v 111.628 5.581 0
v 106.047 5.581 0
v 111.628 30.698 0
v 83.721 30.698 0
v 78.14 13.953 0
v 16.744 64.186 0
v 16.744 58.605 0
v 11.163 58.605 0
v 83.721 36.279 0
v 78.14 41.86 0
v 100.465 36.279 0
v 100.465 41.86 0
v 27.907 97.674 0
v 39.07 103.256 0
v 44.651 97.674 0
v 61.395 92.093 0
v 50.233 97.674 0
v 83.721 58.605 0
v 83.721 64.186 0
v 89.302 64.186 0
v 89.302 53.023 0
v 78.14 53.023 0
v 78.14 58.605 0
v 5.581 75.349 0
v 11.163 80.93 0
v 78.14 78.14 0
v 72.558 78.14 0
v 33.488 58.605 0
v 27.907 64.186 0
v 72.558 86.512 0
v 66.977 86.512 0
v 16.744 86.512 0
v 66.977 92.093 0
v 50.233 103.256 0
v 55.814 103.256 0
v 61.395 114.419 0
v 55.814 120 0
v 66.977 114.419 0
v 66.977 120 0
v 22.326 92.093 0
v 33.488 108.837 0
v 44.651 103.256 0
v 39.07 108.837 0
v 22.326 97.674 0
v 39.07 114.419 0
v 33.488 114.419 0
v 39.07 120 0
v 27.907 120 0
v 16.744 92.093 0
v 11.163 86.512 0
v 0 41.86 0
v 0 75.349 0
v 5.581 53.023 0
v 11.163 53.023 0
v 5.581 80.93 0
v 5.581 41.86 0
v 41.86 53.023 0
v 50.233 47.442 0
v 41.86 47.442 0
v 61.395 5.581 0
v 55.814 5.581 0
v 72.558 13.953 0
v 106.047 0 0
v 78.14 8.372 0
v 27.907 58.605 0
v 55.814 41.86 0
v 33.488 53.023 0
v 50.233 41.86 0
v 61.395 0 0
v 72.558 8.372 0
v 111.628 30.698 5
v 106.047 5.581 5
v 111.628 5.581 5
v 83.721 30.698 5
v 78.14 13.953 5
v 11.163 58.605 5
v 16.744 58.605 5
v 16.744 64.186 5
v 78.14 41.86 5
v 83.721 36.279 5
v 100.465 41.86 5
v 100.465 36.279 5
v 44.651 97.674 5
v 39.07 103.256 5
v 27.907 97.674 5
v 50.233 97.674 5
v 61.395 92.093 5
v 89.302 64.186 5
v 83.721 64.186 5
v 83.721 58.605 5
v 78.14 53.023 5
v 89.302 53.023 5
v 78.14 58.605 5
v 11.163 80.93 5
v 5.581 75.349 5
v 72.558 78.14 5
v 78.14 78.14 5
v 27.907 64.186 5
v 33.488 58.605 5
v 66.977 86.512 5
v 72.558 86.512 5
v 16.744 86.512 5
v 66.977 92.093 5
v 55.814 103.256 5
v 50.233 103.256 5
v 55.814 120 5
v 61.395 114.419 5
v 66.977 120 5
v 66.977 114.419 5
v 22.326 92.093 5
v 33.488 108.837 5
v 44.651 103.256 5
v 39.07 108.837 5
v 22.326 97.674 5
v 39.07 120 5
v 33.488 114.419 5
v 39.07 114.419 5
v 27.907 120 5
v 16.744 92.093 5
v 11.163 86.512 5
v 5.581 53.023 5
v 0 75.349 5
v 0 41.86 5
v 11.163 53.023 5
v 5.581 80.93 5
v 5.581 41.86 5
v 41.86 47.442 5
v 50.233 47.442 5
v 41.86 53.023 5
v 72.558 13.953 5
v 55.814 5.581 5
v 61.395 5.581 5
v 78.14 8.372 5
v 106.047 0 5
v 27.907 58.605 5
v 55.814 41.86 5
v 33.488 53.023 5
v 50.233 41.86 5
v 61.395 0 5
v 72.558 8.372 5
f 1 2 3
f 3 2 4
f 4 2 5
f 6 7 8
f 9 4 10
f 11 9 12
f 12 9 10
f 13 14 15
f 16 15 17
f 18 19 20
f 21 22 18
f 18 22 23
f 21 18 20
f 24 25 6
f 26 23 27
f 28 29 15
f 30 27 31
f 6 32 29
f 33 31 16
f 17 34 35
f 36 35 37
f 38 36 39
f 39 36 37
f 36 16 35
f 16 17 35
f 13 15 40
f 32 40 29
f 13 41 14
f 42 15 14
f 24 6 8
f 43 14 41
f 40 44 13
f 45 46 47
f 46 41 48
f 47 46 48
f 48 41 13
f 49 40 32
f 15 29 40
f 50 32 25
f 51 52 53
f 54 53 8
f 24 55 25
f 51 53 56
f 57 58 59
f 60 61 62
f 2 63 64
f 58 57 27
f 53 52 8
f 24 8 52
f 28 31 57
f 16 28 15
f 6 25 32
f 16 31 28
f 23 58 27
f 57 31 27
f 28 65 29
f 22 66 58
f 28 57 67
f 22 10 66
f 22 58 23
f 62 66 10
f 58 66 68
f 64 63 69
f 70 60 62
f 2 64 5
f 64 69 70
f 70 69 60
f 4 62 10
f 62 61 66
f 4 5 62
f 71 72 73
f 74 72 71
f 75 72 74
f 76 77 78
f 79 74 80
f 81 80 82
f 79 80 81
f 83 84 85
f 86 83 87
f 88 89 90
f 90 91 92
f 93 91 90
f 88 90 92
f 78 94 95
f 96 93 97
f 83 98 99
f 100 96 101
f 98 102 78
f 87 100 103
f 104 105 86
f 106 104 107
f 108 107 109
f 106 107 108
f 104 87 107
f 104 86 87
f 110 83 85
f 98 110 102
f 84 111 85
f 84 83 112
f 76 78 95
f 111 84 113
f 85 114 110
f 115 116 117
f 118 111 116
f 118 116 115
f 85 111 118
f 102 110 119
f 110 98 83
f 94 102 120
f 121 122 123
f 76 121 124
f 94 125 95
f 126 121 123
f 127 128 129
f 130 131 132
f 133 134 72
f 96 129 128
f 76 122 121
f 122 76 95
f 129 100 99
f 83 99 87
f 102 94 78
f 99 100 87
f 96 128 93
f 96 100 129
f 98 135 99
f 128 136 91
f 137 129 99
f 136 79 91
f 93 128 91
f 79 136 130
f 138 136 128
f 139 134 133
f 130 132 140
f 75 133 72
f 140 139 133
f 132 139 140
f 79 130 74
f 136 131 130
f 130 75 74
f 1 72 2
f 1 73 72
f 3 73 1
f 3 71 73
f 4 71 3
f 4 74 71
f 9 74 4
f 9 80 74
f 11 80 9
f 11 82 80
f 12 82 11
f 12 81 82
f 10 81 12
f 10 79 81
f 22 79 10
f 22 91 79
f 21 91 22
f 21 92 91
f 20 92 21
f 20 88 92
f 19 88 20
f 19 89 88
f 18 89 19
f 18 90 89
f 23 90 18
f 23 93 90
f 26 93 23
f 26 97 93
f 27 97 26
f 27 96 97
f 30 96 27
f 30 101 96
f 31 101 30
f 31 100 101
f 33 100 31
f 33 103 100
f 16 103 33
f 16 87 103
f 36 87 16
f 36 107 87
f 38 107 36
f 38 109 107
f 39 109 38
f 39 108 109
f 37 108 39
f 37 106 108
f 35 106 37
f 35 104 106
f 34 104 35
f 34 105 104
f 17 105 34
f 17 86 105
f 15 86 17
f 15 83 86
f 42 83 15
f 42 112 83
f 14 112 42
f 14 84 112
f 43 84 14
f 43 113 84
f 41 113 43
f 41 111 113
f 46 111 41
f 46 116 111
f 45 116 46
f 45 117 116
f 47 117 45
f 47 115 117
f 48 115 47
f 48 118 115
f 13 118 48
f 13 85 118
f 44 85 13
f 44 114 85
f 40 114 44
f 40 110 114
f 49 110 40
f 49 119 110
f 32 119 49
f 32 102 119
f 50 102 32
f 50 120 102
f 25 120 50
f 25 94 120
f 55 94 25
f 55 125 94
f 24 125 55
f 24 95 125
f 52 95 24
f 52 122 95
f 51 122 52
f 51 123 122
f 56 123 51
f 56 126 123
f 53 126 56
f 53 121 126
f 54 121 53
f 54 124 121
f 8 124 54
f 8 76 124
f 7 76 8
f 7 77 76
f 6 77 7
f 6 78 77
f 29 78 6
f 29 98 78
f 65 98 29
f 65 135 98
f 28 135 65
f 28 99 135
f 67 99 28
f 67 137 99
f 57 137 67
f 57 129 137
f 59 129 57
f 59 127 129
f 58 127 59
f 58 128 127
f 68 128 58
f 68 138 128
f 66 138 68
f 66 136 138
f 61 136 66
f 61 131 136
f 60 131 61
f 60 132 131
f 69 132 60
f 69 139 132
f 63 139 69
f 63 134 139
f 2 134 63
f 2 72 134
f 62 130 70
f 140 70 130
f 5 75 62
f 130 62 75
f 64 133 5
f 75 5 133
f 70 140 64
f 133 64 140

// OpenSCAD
/*
 * Customizable Origami - Chrome T-Rex - https://www.thingiverse.com/thing:2700244
 * by Dennis Hofmann - https://www.thingiverse.com/mightynozzle/about
 * created 2017-12-08
 * version v1.0
 *
 * Changelog
 * --------------
 * v1.0:
 *      - final design
 * --------------
 * 
 * This work is licensed under the Creative Commons - Attribution - NonCommercial - ShareAlike license.
 * https://creativecommons.org/licenses/by-nc-sa/3.0/
 */


 // Parameter Section //
//-------------------//

// preview[view:north, tilt:top]

// The maximum size of the longest side. The shorter side will be automatically resized in same ratio.
max_size_in_millimeter = 120; //[20:300]

// The height of the model.
model_height_in_millimeter = 5; //[0.2:0.2:100]

// Thickness of the outer outline.
outline_size_in_millimeter = 0.0; //[0.5:0.1:20]

// Thickness of the inner outline.
inline_size_in_millimeter = 0.0; //[0.5:0.1:20]

// Roundiness of the ends of the inner outlines.
inline_edge_radius_in_millimeter = 0.0; //[0.0:0.1:5]

// Flip model
flip_model = "no"; //[yes,no]

/*[hidden]*/
max_size = max_size_in_millimeter;
model_height = model_height_in_millimeter;
$fn=32;

// Outer Points
A1 = [0, 15];
A2 = [2, 15];
A3 = [2, 19];
A4 = [4, 19];
A5 = [4, 21];
A6 = [6, 21];
A7 = [6, 23];
A8 = [10, 23];
A9 = [10, 21];
A10 = [12, 21];
A11 = [12, 19];
A12 = [15, 19];
A13 = [15, 17];
A14 = [18, 17];
A15 = [18, 15];
A16 = [20, 15];
A17 = [20, 2];
A18 = [22, 2];
A19 = [22, 0];
A20 = [38, 0];
A21 = [38, 2];
A22 = [40, 2];
A23 = [40, 4];
A24 = [40, 11];
A25 = [30, 11];
A26 = [30, 13];
A27 = [36, 13];
A28 = [36, 15];
A29 = [28, 15];
A30 = [28, 19];
A31 = [32, 19];
A32 = [32, 23];
A33 = [30, 23];
A34 = [30, 21];
A35 = [28, 21];
A36 = [28, 28];
A37 = [26, 28];
A38 = [26, 31];
A39 = [24, 31];
A40 = [24, 33];
A41 = [22, 33];
A42 = [22, 41];
A43 = [24, 41];
A44 = [24, 43];
A45 = [20, 43];
A46 = [20, 37];
A47 = [18, 37];
A48 = [18, 35];
A49 = [16, 35];
A50 = [16, 37];
A51 = [14, 37];
A52 = [14, 39];
A53 = [12, 39];
A54 = [12, 41];
A55 = [14, 41];
A56 = [14, 43];
A57 = [10, 43];
A58 = [10, 35];
A59 = [8, 35];
A60 = [8, 33];
A61 = [6, 33];
A62 = [6, 31];
A63 = [4, 31];
A64 = [4, 29];
A65 = [2, 29];
A66 = [2, 27];
A67 = [0, 27];


outline = [A1, A2, A3, A4, A5, A6, A7, A8, A9, A10, A11, A12, A13, A14, A15, A16, A17, A18, A19, A20, A21, A22, A23, A24, A25, A26, A27, A28, A29, A30, A31, A32, A33, A34, A35, A36, A37, A38, A39, A40, A41, A42, A43, A44, A45, A46, A47, A48, A49, A50, A51, A52, A53, A54, A55, A56, A57, A58, A59, A60, A61, A62, A63, A64, A65, A66, A67];

// Inner Points
B1 = [28, 3];
B2 = [26, 3];
B3 = [26, 5];
B4 = [28, 5];

// Polygons
C1 = [B1, B2, B3, B4];

cut_polygons = [C1];

min_x = A67[0];
min_y = A19[1];
max_x = A22[0];
max_y = A45[1];

x_size = max_x - min_x;
y_size = max_y - min_y;

x_factor = max_size / x_size;
y_factor = max_size / y_size;

inline_size = x_size > y_size ? inline_size_in_millimeter / x_factor / 2: inline_size_in_millimeter / y_factor / 2;
inline_edge_radius = x_size > y_size ? inline_edge_radius_in_millimeter / x_factor: inline_edge_radius_in_millimeter / y_factor;
outline_size = x_size > y_size ? outline_size_in_millimeter / x_factor - inline_size: outline_size_in_millimeter / y_factor - inline_size;


 // Program Section //
//-----------------//

if(x_size > y_size) {
    resize(newsize=[max_size, x_factor * y_size, model_height]){
        if(flip_model == "yes") {
            mirror([0,1,0]) {
                rotate([180,180,0]) {    
                    create(outline, cut_polygons);
                }
            }
        } else {
            create(outline, cut_polygons);
        }
    }
} else {
    resize(newsize=[y_factor * x_size, max_size, model_height]){
        if(flip_model == "yes") {
            mirror([0,1,0]) {
                rotate([180,180,0]) {    
                    create(outline, cut_polygons);
                }
            }
        } else {
            create(outline, cut_polygons);
        }
    }
}


 // Module Section //
//----------------//

module create() {
    linear_extrude(height=1) {
        difference() {
            offset(r = -0) {
                offset(r = +outline_size) {
                    polygon(points = outline, convexity = 10);
                }
            }
            
            for(cut_polygon = [0:len(cut_polygons)]) {
                offset(r = +inline_edge_radius) {
                    offset(r = -inline_size - inline_edge_radius) {
                        polygon(points = cut_polygons[cut_polygon], convexity = 10);
                    }
                }
            }
        }
    }
}
